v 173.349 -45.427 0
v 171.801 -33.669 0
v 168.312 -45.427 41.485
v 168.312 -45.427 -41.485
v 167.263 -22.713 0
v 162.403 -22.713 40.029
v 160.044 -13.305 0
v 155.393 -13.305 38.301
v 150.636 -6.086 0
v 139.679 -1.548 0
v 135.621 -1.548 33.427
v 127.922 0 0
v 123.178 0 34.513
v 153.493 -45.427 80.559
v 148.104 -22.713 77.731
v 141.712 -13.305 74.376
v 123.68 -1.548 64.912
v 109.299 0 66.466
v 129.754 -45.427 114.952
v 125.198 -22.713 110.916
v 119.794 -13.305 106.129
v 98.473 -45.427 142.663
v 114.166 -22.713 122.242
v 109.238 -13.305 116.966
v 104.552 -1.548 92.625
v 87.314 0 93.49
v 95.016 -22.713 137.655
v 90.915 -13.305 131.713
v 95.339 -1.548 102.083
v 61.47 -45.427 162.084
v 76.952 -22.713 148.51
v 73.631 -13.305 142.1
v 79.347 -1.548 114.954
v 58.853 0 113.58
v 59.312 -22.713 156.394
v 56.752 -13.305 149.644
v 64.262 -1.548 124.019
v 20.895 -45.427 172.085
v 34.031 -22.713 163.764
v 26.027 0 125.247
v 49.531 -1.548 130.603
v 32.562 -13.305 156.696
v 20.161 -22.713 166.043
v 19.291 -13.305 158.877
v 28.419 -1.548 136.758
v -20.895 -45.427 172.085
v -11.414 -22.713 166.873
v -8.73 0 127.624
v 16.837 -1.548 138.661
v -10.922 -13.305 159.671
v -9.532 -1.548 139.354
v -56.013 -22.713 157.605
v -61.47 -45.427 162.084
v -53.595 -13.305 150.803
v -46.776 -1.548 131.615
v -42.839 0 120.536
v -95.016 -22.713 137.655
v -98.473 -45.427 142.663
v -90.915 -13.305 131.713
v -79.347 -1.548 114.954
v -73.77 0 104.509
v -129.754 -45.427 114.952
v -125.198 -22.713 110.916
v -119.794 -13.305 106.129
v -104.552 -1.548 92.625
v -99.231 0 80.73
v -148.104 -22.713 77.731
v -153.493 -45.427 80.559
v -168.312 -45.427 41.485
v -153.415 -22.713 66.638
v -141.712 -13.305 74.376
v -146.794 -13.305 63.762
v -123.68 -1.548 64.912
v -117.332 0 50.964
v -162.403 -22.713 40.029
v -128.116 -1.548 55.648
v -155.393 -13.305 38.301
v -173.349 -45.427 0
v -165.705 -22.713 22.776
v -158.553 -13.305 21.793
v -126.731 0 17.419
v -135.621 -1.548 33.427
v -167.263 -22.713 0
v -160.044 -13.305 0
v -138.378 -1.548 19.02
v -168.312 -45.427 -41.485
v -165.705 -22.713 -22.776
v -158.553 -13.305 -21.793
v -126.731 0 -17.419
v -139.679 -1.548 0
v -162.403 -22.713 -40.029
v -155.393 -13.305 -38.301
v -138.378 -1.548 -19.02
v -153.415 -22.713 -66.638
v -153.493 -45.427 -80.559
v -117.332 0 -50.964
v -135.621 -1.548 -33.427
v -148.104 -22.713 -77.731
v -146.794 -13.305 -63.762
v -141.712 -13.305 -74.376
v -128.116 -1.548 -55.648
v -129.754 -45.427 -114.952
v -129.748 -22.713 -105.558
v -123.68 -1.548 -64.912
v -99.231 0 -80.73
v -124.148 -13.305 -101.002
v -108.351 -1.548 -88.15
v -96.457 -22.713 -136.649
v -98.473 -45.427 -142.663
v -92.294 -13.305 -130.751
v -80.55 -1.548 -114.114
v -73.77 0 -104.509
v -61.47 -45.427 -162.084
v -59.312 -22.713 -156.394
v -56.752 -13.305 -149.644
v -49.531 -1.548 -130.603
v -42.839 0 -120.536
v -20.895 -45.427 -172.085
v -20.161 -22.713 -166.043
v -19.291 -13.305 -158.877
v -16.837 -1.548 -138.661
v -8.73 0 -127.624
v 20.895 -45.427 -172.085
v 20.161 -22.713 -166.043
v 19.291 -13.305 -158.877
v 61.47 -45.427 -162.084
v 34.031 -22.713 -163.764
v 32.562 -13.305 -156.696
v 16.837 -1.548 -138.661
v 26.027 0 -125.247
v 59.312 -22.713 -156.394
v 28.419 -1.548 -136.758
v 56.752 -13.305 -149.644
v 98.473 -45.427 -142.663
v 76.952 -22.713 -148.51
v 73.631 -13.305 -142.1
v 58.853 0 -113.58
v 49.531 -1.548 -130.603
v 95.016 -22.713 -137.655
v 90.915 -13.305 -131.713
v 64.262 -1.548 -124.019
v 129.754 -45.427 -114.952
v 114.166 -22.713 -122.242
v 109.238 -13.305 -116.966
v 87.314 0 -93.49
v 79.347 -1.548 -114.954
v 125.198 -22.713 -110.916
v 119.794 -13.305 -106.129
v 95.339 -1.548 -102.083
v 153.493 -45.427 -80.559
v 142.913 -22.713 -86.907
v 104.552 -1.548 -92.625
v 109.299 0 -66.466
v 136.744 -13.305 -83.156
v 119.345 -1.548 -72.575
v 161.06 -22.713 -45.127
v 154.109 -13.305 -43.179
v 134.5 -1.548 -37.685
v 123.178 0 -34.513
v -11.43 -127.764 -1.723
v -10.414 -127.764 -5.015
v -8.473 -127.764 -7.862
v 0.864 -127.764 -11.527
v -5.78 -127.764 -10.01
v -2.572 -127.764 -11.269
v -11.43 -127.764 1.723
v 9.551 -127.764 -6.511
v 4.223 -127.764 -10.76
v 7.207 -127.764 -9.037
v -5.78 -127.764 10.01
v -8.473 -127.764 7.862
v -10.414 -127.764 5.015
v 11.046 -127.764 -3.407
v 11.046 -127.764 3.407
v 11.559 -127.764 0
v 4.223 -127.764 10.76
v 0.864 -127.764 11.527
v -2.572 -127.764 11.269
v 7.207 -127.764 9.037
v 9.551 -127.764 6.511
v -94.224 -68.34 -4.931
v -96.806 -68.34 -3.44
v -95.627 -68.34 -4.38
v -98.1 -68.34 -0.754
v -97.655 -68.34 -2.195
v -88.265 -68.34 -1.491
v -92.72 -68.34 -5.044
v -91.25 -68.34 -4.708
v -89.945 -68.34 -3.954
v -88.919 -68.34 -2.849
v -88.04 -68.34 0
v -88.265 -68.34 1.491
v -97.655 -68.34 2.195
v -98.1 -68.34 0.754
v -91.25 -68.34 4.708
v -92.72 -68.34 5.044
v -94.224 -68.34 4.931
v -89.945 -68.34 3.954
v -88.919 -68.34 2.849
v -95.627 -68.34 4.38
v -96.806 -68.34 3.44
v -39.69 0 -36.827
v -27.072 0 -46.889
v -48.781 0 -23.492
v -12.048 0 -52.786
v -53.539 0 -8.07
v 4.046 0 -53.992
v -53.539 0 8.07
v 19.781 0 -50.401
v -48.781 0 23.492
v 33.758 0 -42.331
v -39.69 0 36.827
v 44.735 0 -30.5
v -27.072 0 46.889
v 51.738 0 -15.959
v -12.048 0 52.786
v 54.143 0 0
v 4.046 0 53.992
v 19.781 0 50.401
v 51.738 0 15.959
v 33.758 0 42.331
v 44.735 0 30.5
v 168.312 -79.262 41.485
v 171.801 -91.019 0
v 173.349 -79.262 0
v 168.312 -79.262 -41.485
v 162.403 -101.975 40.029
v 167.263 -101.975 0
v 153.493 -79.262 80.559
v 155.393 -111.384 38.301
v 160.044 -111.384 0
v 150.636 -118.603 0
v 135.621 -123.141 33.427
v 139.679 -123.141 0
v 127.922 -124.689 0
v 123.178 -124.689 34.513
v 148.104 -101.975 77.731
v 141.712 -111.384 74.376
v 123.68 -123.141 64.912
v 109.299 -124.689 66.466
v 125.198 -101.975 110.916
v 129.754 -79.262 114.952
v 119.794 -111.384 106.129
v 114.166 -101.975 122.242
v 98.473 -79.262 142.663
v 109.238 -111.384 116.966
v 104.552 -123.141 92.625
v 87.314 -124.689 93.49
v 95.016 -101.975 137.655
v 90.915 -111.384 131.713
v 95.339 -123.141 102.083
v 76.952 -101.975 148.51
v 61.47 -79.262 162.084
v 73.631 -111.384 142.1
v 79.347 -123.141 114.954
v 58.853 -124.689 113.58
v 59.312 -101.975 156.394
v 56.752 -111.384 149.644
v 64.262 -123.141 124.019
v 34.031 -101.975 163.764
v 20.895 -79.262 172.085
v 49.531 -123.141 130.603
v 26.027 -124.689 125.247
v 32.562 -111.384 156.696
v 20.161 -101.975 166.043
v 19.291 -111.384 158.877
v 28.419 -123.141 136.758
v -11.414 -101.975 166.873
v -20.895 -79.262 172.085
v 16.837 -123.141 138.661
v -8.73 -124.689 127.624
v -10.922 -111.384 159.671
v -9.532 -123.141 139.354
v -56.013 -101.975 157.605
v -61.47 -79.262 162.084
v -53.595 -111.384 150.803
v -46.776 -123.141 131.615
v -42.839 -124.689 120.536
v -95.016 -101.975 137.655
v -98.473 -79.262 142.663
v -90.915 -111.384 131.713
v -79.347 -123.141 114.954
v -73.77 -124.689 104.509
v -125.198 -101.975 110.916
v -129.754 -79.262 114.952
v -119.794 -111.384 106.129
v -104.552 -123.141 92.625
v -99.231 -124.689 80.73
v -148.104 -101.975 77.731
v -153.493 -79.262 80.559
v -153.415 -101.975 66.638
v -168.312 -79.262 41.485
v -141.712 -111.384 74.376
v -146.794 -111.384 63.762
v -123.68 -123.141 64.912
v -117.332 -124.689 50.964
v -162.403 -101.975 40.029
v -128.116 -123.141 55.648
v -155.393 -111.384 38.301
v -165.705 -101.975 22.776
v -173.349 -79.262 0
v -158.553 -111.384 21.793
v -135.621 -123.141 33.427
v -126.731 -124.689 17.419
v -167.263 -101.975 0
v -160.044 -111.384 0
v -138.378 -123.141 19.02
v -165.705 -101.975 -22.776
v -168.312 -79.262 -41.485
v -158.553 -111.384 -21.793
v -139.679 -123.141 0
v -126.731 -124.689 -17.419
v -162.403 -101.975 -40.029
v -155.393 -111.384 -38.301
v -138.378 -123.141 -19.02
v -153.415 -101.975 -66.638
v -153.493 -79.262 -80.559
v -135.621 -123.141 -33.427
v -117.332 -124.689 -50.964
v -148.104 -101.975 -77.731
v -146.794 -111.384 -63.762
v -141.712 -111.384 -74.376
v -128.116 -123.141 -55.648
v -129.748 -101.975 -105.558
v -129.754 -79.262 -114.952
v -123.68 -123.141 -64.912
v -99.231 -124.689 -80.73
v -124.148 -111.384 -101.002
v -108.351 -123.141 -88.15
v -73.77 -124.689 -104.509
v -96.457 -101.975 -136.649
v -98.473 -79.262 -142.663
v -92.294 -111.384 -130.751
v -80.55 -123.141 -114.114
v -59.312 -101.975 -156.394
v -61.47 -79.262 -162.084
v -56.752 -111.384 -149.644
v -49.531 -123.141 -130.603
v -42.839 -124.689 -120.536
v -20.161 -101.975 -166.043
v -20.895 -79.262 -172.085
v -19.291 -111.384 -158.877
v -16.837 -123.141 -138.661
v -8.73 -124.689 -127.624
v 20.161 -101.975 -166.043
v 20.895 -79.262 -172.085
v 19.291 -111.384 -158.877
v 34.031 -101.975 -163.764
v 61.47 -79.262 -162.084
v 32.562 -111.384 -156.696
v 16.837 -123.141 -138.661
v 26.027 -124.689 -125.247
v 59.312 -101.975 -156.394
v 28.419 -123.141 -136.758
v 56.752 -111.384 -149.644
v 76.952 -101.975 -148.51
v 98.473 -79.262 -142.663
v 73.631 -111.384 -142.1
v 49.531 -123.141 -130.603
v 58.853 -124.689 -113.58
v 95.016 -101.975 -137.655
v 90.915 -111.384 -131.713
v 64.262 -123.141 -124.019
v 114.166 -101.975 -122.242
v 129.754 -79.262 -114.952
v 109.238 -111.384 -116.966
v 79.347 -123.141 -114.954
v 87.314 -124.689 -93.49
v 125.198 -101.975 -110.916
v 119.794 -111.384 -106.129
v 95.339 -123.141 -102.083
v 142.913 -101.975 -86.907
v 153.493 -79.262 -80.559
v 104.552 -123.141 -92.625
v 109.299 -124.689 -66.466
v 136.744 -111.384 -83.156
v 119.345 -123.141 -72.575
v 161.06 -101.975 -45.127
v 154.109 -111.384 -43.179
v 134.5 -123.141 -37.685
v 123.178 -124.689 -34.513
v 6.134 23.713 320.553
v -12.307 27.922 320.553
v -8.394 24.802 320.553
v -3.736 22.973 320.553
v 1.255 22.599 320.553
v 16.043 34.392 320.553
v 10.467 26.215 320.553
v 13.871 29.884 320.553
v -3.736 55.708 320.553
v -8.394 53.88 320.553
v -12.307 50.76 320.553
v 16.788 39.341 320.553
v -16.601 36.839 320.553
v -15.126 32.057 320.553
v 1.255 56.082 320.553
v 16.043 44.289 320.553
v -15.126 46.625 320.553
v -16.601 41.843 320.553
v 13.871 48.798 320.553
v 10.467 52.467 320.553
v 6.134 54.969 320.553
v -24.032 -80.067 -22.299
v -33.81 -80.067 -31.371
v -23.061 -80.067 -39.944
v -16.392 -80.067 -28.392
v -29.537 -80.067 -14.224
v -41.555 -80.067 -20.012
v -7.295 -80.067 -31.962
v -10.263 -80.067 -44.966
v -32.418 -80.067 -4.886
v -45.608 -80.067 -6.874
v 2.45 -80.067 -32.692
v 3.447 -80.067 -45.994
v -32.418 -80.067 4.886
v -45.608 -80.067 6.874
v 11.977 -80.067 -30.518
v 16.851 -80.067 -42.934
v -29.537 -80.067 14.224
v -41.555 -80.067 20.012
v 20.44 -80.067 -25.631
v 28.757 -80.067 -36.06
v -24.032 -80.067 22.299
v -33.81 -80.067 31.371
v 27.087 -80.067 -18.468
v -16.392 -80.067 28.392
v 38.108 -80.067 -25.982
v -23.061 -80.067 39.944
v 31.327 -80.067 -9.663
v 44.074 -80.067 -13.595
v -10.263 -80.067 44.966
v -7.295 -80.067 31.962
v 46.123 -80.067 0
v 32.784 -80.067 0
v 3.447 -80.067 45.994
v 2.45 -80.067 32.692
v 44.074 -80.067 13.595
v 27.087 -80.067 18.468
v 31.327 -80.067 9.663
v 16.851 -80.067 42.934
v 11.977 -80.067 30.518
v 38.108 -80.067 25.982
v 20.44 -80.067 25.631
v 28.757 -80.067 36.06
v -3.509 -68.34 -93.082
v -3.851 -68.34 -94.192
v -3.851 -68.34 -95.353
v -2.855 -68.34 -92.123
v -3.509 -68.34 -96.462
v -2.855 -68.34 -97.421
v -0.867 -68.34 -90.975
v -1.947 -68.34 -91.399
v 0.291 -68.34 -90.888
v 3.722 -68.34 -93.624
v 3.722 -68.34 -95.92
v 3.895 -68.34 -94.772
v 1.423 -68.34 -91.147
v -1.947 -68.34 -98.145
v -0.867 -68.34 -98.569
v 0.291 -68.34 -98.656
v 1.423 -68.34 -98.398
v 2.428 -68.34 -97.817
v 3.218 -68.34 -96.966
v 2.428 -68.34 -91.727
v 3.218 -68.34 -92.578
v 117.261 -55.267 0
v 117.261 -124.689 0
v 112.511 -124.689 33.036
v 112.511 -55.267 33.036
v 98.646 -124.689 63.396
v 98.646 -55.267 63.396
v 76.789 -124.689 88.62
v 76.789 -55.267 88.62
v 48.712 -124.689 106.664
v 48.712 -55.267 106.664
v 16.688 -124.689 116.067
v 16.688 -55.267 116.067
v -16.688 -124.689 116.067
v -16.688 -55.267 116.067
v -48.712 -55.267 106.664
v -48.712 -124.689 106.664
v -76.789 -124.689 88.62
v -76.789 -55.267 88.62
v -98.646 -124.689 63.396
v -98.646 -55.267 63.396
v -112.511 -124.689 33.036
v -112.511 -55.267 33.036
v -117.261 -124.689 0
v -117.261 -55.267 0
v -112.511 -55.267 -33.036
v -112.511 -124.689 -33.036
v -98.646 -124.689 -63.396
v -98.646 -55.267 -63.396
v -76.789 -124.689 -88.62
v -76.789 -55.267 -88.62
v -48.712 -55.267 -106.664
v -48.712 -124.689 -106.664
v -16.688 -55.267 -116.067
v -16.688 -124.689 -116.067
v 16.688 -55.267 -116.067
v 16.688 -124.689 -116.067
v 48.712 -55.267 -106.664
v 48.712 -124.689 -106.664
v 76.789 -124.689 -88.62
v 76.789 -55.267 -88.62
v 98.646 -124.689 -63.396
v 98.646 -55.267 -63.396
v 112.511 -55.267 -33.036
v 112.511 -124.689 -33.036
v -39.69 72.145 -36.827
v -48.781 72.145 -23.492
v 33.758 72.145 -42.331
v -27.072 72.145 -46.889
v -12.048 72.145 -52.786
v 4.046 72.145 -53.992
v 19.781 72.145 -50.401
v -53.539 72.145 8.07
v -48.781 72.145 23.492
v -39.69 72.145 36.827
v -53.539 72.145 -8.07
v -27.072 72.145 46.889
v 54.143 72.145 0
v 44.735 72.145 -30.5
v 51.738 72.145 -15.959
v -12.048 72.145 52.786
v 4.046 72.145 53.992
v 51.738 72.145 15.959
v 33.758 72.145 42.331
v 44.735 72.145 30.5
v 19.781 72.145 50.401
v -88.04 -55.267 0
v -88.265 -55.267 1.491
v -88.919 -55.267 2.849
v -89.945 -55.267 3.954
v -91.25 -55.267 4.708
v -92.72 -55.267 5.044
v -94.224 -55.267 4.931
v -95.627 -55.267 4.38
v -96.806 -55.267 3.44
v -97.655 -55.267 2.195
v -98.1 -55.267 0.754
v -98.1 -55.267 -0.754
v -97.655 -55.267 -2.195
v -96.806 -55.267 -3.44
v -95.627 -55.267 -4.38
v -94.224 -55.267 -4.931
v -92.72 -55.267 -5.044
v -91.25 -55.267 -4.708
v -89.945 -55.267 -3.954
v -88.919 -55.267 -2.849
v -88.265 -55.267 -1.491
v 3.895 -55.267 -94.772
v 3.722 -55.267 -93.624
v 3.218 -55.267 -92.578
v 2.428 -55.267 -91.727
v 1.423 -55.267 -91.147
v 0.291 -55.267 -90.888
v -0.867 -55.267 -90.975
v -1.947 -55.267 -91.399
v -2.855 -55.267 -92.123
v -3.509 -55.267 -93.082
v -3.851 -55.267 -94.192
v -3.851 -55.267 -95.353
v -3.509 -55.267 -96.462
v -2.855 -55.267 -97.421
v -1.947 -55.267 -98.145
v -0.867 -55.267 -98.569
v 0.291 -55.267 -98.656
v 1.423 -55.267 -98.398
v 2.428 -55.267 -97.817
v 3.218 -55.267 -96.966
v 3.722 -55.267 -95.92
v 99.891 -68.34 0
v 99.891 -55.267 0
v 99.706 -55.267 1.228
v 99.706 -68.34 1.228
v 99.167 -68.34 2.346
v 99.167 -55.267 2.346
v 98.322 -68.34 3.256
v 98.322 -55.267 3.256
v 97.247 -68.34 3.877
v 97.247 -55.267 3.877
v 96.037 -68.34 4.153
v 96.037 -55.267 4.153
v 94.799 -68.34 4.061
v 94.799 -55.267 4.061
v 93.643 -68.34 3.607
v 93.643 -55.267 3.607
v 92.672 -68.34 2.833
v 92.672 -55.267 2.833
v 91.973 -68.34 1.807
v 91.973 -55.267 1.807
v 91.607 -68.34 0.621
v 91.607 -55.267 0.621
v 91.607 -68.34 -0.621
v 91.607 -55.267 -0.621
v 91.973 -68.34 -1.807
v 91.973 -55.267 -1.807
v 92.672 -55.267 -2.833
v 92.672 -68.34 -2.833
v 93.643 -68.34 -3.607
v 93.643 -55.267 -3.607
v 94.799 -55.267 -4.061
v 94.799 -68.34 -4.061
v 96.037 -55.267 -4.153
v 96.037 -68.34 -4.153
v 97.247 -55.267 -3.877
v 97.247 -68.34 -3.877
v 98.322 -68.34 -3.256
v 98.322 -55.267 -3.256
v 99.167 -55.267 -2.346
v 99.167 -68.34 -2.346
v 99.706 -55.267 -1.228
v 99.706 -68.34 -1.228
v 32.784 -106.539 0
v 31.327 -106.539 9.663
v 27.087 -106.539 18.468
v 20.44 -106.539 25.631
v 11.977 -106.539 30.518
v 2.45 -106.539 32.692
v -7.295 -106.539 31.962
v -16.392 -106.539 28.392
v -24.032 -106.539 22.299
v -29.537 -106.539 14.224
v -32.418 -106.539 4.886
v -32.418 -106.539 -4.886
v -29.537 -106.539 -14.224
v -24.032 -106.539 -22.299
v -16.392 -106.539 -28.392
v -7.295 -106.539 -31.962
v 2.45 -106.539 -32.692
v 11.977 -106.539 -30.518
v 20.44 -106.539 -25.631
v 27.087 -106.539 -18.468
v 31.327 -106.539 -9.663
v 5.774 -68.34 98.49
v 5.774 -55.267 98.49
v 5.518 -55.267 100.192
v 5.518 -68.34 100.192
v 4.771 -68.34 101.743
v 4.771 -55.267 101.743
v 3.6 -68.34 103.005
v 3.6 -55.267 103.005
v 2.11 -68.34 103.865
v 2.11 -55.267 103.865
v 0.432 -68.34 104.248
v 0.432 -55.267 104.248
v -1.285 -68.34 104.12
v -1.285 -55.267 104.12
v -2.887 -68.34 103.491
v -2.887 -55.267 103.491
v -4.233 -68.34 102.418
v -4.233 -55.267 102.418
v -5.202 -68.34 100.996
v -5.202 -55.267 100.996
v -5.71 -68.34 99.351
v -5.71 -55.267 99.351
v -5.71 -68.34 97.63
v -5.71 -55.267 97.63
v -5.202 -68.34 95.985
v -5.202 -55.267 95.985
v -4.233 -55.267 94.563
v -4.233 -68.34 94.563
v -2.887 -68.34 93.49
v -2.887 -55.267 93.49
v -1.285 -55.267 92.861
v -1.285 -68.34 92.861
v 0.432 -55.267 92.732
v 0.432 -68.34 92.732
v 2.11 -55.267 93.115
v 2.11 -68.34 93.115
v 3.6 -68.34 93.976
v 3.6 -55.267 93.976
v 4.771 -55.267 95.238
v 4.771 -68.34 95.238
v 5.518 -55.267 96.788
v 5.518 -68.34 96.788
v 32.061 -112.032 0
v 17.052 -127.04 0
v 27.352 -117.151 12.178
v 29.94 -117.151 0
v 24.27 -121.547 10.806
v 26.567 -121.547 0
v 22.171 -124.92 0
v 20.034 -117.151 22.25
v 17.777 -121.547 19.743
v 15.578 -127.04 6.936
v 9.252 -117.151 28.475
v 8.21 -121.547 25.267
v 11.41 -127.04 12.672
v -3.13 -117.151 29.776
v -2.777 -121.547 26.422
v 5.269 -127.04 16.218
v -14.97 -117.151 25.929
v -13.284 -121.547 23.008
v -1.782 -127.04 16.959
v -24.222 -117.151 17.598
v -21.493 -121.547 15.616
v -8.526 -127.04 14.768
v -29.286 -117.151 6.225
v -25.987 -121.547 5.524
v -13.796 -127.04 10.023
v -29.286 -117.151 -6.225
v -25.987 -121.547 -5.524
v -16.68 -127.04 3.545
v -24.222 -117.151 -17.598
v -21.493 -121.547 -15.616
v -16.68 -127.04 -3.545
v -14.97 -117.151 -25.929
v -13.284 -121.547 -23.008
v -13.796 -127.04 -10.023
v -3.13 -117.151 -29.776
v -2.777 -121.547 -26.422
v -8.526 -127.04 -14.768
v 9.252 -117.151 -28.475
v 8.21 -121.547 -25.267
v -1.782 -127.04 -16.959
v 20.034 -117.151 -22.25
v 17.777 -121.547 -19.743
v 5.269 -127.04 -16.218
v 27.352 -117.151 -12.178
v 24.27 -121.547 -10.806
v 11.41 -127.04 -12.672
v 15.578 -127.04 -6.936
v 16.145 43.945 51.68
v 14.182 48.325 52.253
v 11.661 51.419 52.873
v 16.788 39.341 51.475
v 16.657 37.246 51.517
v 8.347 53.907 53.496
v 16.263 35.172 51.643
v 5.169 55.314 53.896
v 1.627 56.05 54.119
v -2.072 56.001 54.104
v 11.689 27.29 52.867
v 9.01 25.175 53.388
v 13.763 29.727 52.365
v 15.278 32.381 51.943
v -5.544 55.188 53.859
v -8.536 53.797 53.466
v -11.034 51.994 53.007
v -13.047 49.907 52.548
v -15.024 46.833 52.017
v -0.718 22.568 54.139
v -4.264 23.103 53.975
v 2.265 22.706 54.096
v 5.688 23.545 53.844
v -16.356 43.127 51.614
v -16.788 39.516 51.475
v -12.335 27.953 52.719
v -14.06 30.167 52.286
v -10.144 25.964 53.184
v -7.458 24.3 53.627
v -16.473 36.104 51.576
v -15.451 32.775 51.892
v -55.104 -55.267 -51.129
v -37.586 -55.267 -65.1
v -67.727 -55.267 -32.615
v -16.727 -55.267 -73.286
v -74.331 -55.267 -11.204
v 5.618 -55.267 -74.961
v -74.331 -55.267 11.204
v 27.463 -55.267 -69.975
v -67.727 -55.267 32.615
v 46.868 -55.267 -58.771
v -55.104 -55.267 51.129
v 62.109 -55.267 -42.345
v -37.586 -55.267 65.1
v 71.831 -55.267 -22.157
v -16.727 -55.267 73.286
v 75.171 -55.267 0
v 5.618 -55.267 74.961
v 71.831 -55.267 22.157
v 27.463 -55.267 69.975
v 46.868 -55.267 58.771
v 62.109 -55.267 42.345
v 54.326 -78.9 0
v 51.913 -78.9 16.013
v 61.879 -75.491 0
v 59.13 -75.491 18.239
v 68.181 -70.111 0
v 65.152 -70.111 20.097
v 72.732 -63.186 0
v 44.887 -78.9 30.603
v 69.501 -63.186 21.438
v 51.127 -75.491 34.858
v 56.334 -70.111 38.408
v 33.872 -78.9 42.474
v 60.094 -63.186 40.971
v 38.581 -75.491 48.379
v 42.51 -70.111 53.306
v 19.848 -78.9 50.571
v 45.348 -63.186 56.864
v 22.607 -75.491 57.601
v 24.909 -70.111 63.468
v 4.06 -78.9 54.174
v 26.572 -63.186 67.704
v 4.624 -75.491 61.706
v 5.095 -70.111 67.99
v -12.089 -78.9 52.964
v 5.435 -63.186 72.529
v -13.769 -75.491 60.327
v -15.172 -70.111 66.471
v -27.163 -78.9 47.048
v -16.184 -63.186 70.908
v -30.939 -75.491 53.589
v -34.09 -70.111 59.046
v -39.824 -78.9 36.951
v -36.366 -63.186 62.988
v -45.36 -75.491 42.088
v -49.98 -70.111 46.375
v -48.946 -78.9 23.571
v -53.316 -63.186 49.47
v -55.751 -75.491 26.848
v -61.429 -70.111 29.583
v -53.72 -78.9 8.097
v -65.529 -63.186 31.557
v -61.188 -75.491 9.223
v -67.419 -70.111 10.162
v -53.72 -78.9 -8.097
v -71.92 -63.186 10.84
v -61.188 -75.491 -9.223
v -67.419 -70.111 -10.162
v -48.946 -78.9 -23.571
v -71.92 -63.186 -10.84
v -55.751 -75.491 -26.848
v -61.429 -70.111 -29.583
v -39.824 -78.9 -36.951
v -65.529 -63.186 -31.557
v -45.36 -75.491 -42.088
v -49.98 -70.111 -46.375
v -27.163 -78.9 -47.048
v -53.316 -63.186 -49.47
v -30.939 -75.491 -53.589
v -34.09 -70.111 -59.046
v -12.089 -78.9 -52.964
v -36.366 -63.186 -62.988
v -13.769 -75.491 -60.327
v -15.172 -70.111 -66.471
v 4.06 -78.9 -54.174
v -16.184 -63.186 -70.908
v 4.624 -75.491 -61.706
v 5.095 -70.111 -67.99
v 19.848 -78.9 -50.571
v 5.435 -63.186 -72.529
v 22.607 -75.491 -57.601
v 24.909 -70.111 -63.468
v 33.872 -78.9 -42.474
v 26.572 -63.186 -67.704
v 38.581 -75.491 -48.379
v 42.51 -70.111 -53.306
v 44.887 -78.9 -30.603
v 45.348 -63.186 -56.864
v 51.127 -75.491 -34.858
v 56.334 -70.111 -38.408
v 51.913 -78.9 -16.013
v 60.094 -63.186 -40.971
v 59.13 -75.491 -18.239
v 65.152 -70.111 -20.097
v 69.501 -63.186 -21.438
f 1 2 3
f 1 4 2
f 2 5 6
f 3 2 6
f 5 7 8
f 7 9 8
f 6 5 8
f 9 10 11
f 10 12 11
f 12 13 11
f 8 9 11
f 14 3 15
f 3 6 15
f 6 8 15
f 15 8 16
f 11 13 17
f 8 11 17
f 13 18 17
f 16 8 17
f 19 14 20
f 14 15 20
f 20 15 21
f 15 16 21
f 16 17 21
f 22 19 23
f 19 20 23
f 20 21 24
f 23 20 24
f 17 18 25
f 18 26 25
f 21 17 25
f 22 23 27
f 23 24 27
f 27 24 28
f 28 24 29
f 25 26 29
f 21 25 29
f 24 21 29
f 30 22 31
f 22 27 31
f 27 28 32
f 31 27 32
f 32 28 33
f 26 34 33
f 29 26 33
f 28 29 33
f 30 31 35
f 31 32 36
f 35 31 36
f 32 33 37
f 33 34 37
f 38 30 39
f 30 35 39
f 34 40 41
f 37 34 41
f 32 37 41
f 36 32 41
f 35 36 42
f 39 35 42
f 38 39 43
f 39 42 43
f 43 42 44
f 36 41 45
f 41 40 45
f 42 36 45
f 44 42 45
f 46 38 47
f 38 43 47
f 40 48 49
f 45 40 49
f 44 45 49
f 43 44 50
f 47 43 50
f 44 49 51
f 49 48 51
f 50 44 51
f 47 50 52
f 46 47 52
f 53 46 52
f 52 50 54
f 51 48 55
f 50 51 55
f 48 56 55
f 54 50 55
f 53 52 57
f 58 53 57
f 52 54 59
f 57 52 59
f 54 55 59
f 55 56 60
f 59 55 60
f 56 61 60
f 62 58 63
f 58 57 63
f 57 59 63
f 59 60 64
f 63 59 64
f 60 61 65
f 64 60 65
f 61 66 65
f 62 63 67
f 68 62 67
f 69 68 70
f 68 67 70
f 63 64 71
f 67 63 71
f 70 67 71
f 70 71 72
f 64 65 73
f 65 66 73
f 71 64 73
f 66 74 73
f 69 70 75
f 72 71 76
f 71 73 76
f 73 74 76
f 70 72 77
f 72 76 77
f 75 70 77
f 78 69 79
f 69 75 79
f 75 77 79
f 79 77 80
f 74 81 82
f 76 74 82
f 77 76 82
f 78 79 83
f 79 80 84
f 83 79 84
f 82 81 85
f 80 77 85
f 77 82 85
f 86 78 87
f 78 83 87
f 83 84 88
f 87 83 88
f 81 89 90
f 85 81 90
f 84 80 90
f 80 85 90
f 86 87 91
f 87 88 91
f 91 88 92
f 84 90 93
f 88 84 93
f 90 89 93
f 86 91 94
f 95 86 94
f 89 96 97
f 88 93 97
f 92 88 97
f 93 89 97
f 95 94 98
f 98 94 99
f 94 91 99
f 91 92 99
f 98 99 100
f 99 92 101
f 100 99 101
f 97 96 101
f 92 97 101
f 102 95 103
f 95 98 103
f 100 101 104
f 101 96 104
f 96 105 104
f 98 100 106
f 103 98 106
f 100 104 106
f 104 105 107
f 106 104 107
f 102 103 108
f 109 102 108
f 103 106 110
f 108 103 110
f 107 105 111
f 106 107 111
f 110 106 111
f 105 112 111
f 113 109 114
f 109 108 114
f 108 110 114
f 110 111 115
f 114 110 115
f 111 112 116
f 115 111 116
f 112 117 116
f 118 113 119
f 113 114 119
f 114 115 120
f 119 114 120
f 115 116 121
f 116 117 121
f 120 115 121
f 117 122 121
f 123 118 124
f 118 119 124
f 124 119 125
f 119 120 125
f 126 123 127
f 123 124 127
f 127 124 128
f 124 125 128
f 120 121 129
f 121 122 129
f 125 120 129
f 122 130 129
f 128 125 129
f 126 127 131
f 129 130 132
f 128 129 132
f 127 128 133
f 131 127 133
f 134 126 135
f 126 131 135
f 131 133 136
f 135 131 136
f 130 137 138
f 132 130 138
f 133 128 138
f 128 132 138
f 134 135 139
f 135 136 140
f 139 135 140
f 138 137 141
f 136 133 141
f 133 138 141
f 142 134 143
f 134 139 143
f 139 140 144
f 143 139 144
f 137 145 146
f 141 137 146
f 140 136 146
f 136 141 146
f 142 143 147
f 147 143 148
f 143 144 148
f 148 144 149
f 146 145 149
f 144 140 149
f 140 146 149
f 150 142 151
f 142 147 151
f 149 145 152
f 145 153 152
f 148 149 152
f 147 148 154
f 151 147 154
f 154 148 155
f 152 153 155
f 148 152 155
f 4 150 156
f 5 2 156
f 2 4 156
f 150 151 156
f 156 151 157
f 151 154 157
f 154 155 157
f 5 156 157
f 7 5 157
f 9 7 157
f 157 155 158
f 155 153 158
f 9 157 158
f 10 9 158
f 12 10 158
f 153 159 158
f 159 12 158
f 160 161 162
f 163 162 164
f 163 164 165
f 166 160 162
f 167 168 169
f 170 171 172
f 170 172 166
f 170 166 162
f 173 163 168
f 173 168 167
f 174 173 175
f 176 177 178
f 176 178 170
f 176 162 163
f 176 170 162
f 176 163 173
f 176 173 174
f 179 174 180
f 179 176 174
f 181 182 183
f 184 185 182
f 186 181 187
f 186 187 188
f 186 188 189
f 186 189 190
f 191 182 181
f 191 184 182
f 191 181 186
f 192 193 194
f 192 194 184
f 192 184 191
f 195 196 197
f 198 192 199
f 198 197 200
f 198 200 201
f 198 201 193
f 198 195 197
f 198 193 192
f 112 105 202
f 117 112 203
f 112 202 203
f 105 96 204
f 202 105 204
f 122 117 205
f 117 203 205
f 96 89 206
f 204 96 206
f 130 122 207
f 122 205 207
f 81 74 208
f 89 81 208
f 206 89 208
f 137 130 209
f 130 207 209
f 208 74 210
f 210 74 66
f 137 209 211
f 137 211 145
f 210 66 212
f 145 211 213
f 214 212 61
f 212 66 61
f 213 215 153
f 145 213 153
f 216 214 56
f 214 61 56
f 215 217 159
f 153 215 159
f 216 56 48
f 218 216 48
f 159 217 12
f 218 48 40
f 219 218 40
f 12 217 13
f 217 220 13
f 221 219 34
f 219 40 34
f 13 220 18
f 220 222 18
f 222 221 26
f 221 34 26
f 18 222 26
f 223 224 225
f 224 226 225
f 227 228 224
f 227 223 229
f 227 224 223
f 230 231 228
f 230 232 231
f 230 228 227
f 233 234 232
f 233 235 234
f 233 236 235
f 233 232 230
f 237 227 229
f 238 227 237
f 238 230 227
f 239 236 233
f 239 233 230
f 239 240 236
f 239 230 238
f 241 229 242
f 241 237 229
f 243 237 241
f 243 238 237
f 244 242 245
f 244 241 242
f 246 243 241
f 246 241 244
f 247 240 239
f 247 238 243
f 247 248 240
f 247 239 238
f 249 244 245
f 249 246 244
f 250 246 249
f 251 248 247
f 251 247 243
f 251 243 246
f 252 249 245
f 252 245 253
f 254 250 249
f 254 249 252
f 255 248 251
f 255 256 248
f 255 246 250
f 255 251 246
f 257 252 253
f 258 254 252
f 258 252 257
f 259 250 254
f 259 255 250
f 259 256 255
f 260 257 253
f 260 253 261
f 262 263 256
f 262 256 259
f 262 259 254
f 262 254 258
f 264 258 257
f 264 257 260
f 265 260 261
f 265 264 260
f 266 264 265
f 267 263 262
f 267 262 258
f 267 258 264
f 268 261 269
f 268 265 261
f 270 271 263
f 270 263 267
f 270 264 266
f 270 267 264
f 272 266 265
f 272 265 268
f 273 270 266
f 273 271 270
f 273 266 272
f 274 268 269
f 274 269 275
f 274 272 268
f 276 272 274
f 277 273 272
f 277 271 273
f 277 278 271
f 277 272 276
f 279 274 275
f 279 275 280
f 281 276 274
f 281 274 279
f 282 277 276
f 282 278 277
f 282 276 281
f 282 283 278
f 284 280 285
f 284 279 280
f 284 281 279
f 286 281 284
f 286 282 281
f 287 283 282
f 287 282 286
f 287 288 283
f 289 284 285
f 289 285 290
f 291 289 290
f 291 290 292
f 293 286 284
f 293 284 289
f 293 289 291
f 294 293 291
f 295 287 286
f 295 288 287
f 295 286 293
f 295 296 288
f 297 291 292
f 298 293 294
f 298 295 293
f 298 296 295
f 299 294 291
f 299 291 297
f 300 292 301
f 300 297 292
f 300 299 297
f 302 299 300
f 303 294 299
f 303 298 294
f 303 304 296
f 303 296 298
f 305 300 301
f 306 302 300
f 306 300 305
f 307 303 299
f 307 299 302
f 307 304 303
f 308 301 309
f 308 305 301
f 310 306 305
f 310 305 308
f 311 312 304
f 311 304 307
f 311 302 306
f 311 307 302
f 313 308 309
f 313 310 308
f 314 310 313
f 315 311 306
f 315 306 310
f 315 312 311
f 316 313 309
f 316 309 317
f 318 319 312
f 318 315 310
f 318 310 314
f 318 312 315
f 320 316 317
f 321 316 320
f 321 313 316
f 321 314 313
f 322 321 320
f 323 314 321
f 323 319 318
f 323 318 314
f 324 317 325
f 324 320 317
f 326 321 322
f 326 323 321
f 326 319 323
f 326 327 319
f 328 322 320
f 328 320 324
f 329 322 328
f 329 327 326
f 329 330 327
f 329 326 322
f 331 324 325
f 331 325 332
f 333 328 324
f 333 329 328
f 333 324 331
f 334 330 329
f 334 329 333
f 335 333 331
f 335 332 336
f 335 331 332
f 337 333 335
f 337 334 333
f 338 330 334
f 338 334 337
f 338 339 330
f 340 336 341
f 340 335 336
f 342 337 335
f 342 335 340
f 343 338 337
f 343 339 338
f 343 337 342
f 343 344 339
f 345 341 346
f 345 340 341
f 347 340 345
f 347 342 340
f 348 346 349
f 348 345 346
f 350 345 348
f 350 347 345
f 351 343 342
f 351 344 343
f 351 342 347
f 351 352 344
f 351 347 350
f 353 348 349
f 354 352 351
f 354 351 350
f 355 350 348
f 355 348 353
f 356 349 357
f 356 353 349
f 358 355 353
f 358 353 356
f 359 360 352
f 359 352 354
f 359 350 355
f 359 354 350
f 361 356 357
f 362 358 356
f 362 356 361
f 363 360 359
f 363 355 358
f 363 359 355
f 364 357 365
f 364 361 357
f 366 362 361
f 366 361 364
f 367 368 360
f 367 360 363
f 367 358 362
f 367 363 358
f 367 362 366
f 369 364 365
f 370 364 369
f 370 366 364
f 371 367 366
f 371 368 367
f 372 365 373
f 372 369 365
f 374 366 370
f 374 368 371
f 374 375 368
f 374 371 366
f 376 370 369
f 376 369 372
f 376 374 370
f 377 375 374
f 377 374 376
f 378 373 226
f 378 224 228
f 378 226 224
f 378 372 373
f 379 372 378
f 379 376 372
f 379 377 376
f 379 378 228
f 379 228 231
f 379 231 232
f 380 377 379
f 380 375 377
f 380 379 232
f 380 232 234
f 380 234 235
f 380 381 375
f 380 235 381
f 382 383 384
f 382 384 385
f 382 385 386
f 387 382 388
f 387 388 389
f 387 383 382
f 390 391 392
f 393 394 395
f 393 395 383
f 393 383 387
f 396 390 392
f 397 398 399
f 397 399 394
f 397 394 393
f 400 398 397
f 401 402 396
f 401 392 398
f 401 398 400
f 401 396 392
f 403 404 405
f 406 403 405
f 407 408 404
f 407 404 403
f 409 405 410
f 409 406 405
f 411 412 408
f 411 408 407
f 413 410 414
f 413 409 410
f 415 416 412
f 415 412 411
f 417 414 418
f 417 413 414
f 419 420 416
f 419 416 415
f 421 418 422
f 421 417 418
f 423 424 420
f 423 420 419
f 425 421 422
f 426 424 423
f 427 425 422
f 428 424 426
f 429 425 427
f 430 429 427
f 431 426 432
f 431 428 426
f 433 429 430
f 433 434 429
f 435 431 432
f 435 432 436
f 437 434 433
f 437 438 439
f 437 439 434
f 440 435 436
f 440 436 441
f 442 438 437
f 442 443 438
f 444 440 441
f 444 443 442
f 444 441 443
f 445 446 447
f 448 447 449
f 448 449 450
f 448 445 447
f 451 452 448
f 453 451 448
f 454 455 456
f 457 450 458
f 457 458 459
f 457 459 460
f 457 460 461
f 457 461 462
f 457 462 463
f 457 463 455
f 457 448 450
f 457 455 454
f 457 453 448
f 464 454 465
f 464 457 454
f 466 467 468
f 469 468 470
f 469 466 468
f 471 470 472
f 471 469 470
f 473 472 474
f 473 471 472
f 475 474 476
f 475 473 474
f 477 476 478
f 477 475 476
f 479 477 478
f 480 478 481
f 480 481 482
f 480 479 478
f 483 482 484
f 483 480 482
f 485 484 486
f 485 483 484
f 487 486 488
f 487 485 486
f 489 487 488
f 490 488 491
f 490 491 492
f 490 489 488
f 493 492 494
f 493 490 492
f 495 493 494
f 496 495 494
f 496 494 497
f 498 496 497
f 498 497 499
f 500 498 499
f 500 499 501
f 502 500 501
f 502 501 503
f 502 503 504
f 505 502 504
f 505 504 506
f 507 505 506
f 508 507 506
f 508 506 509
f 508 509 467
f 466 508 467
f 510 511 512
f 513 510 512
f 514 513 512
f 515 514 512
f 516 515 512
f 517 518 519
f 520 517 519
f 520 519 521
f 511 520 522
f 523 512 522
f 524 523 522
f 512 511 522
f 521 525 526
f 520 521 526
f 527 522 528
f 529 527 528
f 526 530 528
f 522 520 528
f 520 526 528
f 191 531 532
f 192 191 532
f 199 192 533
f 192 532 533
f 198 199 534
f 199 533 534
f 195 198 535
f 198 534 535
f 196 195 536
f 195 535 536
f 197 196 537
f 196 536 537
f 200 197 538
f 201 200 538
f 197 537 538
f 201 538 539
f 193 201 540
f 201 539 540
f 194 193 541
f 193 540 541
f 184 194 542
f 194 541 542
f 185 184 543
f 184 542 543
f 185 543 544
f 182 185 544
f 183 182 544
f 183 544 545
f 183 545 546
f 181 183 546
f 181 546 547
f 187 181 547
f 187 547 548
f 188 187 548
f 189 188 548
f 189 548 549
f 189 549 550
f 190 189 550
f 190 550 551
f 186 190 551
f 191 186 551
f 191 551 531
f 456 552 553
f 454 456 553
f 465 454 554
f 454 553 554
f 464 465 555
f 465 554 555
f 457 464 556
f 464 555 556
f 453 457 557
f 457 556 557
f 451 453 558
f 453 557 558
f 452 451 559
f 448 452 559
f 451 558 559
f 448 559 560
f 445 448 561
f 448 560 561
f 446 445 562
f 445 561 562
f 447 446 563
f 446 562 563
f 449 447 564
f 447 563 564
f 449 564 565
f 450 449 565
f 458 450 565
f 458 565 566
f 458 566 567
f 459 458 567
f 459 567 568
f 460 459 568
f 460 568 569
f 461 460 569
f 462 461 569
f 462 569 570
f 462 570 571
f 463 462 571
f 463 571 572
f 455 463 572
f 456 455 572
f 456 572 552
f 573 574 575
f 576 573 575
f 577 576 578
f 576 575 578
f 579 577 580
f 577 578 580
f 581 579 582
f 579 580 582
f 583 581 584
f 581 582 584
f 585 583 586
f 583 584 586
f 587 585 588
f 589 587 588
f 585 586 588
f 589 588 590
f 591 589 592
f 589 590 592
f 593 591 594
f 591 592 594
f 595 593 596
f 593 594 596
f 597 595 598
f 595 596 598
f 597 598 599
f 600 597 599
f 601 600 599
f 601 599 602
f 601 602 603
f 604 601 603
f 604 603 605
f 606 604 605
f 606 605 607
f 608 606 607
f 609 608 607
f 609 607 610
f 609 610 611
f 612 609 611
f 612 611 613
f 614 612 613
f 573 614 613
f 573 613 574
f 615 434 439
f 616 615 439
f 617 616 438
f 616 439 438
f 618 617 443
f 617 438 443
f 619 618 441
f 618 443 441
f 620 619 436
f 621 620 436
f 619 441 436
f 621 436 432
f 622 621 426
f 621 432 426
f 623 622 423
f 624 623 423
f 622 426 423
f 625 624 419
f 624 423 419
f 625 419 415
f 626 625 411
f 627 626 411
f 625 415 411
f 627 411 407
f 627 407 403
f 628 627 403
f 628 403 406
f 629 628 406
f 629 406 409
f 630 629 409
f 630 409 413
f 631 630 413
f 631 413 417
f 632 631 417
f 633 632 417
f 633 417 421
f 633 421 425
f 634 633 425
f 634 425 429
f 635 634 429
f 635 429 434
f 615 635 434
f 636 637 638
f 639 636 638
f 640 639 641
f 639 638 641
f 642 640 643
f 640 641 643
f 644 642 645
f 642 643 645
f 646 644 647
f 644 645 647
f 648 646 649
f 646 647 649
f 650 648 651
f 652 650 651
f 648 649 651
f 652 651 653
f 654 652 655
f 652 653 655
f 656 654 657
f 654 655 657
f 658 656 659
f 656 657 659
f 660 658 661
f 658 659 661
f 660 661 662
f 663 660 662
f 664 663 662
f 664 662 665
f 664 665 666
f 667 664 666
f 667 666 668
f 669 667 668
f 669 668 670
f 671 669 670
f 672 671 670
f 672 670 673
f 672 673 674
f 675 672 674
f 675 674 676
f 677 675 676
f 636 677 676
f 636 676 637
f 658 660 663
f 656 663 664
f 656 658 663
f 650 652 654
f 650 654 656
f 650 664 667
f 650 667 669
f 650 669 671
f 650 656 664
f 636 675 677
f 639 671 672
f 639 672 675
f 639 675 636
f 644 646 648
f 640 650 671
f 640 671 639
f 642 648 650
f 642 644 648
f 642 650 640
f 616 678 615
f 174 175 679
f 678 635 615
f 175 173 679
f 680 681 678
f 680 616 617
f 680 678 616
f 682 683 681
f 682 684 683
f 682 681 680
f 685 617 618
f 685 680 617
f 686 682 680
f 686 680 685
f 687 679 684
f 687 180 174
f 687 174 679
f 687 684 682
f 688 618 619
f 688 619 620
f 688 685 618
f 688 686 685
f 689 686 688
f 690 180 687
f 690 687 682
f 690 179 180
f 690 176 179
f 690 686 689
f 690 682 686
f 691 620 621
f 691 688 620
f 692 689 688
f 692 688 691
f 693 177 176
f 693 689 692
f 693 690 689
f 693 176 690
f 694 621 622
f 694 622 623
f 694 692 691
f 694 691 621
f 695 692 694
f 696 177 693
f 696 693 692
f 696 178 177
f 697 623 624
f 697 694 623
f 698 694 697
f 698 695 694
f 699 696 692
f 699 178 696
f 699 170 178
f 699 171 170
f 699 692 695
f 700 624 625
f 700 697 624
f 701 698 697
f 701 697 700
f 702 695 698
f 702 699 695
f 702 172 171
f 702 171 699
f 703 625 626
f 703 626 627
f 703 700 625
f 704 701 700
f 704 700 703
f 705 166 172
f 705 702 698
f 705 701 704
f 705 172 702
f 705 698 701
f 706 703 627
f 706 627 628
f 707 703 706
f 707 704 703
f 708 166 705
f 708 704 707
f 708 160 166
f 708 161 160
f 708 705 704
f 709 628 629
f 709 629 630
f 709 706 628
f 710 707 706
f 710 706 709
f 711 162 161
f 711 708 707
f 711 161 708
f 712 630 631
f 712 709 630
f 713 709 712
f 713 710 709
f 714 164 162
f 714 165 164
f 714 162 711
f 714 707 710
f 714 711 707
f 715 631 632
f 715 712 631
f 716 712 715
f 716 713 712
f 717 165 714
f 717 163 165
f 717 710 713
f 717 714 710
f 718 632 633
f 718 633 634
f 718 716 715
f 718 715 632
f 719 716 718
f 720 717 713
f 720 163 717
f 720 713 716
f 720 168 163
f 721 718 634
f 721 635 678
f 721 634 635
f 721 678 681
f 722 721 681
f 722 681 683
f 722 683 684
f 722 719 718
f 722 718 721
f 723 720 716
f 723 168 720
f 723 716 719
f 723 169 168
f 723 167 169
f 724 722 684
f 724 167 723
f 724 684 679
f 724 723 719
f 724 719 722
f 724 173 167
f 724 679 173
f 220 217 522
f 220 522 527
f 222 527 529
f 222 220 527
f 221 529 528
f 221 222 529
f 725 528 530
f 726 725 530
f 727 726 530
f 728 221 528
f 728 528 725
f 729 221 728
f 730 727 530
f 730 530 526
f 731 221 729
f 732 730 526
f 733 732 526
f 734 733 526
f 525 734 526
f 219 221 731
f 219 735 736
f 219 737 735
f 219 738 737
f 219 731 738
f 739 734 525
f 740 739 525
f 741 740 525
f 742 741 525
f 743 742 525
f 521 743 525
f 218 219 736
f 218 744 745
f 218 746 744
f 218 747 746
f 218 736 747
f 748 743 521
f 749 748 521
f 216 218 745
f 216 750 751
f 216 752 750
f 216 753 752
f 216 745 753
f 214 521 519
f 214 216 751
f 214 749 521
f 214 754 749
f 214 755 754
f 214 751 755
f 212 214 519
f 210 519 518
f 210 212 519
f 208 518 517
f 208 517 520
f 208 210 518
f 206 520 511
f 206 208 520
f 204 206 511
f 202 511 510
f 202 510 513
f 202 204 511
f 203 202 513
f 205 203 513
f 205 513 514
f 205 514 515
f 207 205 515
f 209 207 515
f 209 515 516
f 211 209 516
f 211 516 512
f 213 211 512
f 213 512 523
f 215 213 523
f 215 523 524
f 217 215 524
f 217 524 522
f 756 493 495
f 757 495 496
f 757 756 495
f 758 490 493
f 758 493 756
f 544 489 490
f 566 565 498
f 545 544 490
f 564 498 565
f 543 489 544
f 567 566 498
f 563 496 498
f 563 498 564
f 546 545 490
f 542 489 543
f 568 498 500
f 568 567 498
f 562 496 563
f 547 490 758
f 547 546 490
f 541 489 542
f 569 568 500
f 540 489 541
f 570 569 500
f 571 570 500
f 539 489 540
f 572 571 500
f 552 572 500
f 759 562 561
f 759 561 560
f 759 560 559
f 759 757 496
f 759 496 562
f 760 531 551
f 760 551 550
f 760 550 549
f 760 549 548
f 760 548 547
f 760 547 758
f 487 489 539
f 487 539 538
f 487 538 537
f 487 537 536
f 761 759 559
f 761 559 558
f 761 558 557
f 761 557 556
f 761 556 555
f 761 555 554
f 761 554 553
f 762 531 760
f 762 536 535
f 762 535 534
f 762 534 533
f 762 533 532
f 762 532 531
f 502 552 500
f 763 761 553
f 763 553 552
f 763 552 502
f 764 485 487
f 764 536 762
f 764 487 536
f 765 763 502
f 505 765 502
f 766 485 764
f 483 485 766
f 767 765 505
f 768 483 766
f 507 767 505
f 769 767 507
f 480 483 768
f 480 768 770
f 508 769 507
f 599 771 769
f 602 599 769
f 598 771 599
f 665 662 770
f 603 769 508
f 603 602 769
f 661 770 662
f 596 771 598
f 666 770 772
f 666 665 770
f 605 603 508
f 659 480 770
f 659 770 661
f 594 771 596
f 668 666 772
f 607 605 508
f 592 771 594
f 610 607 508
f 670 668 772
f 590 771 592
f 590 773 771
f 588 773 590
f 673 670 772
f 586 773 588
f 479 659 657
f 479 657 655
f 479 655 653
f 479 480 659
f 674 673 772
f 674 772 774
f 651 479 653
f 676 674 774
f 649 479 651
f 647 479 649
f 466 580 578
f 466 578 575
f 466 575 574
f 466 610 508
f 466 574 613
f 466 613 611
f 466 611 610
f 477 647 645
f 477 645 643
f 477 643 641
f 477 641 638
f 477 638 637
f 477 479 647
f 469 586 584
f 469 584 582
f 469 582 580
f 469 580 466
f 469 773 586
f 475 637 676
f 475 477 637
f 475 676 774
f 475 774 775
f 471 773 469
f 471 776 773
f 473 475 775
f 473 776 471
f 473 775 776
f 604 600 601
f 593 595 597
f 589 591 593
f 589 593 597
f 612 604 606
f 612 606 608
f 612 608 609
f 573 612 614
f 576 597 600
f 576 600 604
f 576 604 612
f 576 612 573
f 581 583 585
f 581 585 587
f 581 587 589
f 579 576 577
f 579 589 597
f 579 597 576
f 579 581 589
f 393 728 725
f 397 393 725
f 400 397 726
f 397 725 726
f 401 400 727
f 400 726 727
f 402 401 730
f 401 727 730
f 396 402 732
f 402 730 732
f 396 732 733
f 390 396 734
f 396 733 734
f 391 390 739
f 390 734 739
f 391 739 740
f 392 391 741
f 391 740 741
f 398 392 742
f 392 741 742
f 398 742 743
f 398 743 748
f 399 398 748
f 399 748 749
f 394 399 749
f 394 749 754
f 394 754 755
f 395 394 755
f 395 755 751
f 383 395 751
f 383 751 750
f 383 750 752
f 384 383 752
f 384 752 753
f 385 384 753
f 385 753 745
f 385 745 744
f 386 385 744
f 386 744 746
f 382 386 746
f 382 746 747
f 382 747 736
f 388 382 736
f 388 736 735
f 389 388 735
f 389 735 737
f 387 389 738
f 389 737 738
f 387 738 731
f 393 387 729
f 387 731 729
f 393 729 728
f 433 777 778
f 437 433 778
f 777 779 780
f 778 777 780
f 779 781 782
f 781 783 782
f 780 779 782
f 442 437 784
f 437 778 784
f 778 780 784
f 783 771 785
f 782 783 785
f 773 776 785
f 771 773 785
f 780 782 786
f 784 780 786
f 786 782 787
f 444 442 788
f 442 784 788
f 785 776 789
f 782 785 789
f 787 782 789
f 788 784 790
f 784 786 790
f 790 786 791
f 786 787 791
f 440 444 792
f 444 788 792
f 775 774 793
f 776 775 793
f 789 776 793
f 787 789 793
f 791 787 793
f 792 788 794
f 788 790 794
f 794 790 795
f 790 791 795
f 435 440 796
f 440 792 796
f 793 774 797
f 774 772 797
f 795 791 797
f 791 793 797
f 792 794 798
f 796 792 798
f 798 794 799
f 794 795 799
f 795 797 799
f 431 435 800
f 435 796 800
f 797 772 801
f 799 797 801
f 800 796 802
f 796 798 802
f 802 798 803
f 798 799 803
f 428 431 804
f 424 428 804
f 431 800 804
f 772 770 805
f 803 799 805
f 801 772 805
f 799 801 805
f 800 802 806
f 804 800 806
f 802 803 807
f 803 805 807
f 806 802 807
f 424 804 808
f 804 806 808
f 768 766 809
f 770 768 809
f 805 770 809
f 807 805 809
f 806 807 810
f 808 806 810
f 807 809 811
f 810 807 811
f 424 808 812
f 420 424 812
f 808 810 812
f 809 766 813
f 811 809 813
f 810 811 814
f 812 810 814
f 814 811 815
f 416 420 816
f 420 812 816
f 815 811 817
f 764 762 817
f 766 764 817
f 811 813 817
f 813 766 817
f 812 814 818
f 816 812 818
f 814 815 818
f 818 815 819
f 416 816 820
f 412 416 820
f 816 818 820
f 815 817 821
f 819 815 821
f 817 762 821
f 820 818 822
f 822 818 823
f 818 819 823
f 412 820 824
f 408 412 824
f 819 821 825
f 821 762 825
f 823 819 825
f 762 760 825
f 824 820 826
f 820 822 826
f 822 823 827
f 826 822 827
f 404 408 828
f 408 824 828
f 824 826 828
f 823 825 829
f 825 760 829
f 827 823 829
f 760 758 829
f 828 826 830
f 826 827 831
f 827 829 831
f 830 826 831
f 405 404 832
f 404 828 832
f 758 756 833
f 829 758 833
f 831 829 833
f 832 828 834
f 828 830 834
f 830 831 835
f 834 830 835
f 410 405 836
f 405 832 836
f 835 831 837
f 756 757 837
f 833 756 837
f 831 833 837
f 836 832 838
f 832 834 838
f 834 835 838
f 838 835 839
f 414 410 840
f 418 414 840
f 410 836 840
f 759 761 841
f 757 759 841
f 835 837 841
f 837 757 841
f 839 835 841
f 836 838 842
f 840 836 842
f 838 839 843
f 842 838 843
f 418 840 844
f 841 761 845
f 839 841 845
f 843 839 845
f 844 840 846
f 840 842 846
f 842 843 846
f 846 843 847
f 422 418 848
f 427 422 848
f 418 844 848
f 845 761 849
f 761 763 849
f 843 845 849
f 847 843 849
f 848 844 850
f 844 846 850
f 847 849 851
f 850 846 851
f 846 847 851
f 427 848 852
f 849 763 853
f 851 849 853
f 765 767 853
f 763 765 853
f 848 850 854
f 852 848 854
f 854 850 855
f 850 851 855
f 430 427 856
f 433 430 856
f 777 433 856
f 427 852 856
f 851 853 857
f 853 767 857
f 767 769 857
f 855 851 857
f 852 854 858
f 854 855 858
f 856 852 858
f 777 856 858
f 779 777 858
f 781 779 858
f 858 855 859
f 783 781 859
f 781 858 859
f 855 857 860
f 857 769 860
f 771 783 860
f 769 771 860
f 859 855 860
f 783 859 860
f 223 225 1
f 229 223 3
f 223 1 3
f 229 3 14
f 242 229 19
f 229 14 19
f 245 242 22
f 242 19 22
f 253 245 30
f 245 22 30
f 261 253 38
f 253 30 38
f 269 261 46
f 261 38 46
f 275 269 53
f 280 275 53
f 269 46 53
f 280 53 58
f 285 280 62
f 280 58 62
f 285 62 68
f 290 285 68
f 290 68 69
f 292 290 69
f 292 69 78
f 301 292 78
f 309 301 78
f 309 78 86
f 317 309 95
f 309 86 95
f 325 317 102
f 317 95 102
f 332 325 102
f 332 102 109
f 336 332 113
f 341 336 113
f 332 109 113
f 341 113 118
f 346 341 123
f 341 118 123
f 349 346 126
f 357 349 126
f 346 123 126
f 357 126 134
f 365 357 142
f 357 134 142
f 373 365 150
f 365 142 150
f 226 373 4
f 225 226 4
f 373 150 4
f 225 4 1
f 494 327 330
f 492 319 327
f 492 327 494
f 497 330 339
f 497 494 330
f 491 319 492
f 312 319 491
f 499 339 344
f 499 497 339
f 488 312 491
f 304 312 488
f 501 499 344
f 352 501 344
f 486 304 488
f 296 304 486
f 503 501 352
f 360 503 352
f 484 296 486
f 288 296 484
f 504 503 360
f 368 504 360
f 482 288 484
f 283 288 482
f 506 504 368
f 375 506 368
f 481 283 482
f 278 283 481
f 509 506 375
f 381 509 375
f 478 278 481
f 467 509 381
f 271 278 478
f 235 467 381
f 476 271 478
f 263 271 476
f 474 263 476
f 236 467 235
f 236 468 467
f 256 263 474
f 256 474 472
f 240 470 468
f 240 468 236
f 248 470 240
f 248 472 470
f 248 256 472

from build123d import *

# Parameters (mm, degrees)
F0_R      = 173.3489517692
F0_R_2    = 117.2606948697
F1_DEPTH  = 124.6887519956
F2_R      = 45.426792545
F3_R      = 121.2481204934
F4_DEPTH  = 55.2671570331
F5_R      = 75.1710071643
F6_DEPTH  = 80.0674576312
F7_R      = 32.7838298789
F8_DEPTH  = 127.7635861188
F9_R      = 21.2247552793
F11_R     = 54.14327209
F12_DEPTH = 72.1452143043
F13_R     = 16.7884886241
F14_DEPTH = 320.553438738
F15_R     = 5.7742203186
F15_R_2   = 5.0578841716
F15_R_3   = 3.8948170444
F15_R_4   = 4.1650665602
F16_DEPTH = 68.3403462172


# Not quite as in the source:
# - a fillet or chamfer that OpenCascade refuses, or shapes differently, is made with other operations: its cross-section is extruded or revolved along the edge and cut away or added


with BuildPart() as f1:
    # F0 (on Front) → F1 (new body)
    with BuildSketch(Plane.XZ):
        Circle(F0_R)
        Circle(F0_R_2, mode=Mode.SUBTRACT)
    extrude(amount=F1_DEPTH)

    # F2
    f2_edges = [f1.edges().sort_by_distance(p)[0] for p in [
        (-173.348952, 0, 0),
        (-173.348952, -124.688752, 0),
    ]]
    fillet(f2_edges, radius=F2_R)

    # F3 (on Front) → F4 (join)
    with BuildSketch(Plane.XZ):
        Circle(F3_R)
    extrude(amount=F4_DEPTH)

    # F5 (on Front) → F6 (join)
    with BuildSketch(Plane.XZ):
        Circle(F5_R)
    extrude(amount=F6_DEPTH)

    # F7 (on Front) → F8 (join)
    with BuildSketch(Plane.XZ):
        Circle(F7_R)
    extrude(amount=F8_DEPTH)

    # F9
    f9_edges = [f1.edges().sort_by_distance(p)[0] for p in [
        (-32.78383, -127.763586, 0),
    ]]
    fillet(f9_edges, radius=F9_R)

    # F10: fillet of radius 29.4120223151 on 1 edges, made by hand

    # F10_s1 → F10_t2 (revolve, cut)
    with BuildSketch(Plane.XY):
        with BuildLine():
            ThreePointArc((46.1227872623, -80.0674576312), (65.2202608468, -73.0240195216), (75.1710071643, -55.2671570331))
            Line((75.1710071643, -55.2671570331), (75.1710071643, -80.0674576312))
            Line((75.1710071643, -80.0674576312), (46.1227872623, -80.0674576312))
        make_face()
    revolve(axis=Axis((0, -80.0674576312, 0), (0, -1, 0)), mode=Mode.SUBTRACT)

    # F11 (on Front) → F12 (join)
    with BuildSketch(Plane.XZ):
        Circle(F11_R)
    extrude(amount=-F12_DEPTH)

    # F13 (on Top) → F14 (join)
    with BuildSketch(Plane.XY):
        with Locations((0, 39.3408536911)):
            Circle(F13_R)
    extrude(amount=F14_DEPTH)

    # F15 (on Front) → F16 (join)
    with BuildSketch(Plane.XZ):
        with Locations((0, 98.4903275967)):
            Circle(F15_R)
        with Locations((-93.0983424187, 0)):
            Circle(F15_R_2)
        with Locations((0, -94.7722494602)):
            Circle(F15_R_3)
        with Locations((95.7255959511, 0)):
            Circle(F15_R_4)
    extrude(amount=F16_DEPTH)


solid = f1.part
